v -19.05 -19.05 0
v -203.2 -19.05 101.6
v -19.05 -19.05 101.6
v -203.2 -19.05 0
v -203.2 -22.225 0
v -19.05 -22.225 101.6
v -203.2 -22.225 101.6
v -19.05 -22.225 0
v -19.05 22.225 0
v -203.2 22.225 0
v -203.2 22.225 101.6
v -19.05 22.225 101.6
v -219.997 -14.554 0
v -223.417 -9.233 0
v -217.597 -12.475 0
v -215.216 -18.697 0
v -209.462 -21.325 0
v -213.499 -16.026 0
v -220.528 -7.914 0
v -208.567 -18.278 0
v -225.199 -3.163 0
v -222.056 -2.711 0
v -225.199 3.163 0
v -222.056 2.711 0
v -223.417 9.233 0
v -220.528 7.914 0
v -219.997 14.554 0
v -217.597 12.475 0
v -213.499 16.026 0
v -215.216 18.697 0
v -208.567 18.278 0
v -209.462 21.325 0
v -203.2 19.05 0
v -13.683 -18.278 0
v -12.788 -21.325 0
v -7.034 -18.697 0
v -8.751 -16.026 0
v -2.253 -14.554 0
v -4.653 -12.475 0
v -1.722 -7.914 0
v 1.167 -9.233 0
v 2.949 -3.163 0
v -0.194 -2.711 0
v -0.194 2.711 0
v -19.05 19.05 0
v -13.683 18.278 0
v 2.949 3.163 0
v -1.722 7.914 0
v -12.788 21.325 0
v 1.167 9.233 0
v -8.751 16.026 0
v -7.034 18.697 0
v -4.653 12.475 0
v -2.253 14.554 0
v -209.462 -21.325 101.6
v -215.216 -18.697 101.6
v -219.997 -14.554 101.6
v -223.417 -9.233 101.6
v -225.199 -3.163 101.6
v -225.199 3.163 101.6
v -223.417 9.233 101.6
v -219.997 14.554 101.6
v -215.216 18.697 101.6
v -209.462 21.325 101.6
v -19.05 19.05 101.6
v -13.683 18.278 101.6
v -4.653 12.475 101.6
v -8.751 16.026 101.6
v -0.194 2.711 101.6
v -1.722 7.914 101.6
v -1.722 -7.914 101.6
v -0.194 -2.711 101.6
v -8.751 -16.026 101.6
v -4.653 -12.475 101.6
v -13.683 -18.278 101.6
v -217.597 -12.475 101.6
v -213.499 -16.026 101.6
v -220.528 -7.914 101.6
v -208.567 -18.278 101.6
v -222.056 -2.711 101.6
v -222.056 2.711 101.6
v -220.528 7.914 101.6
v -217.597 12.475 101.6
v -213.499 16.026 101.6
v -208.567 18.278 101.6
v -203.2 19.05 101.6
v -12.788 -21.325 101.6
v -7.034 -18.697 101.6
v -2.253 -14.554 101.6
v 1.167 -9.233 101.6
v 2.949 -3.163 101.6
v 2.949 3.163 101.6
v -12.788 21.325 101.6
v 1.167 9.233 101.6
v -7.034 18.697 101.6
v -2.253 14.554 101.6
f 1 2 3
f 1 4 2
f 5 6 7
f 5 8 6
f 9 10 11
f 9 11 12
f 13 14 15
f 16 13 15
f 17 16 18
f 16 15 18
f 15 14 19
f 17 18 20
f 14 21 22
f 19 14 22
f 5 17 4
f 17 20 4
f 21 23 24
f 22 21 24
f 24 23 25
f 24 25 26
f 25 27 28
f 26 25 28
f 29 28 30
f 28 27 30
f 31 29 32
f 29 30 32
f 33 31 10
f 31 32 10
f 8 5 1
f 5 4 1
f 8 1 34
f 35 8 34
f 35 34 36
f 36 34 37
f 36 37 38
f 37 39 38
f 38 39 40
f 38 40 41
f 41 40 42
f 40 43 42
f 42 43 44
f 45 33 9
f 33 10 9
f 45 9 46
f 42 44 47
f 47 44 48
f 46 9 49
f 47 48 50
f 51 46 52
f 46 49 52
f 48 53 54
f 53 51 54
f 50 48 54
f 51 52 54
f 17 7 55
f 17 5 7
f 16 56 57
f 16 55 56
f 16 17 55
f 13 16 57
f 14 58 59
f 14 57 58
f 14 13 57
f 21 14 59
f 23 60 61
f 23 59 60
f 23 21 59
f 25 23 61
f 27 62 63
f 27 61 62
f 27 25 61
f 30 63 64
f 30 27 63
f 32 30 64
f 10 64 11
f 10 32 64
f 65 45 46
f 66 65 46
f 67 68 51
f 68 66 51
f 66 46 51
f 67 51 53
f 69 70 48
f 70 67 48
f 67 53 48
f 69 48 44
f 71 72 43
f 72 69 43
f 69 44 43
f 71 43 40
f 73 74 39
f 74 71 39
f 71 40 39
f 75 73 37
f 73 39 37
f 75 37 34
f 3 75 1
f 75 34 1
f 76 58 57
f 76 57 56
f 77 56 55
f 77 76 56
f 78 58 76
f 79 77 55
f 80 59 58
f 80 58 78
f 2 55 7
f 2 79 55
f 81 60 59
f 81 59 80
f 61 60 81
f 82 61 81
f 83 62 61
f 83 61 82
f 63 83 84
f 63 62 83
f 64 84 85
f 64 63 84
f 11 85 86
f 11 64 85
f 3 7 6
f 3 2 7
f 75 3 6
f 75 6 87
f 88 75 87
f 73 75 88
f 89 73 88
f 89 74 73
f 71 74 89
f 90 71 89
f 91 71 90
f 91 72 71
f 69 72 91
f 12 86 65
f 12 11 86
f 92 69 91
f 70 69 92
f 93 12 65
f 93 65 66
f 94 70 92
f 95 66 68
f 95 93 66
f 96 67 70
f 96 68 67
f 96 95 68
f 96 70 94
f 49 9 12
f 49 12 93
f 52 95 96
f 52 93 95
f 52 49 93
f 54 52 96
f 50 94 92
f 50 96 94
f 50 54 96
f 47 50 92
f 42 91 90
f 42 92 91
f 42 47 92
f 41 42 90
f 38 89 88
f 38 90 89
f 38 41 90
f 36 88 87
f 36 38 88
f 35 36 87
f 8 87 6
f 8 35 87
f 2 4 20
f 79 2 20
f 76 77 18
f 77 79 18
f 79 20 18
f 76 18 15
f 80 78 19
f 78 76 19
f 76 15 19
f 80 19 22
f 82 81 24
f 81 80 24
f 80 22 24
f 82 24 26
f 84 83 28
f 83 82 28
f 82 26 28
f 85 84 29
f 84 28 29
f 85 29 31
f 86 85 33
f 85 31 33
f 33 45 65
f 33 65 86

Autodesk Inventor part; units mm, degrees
ref_plane "YZ Plane" through (0, 0, 0) normal (1, 0, 0) x (0, 1, 0)
ref_plane "XZ Plane" through (0, 0, 0) normal (0, 1, 0) x (-1, 0, 0)
ref_plane "XY Plane" through (0, 0, 0) normal (0, 0, 1) x (1, 0, 0)
sketch "Sketch1" plane through (0, 0, 0) normal (0, 0, 1) x (1, 0, 0)
  line L0 (0, 0) -> (-222.25, 0) construction
  line L1 (-19.05, 19.05) -> (-203.2, 19.05)
  line L2 (-203.2, -19.05) -> (-19.05, -19.05)
  arc A0 (-19.05, -19.05) -> (-19.05, 19.05) centre (-19.05, 0) ccw
  arc A1 (-203.2, 19.05) -> (-203.2, -19.05) centre (-203.2, 0) ccw
  line L3 (0, 0) -> (222.25, 0) construction
  line L4 (-203.2, 22.225) -> (-19.05, 22.225)
  arc A2 (-19.05, -22.225) -> (-19.05, 22.225) centre (-19.05, 0) ccw
  line L5 (-19.05, -22.225) -> (-203.2, -22.225)
  arc A3 (-203.2, 22.225) -> (-203.2, -22.225) centre (-203.2, 0) ccw
  point P0 (-111.125, 0)
  dimension "d0" = 222.25
  dimension "d1" = 180
  dimension "d2" = 38.1
  dimension "d3" = 3.175
extrude "Extrusion1" add sketch "Sketch1" along normal blind 101.6
properties part number "Shooting_Belt_2"
